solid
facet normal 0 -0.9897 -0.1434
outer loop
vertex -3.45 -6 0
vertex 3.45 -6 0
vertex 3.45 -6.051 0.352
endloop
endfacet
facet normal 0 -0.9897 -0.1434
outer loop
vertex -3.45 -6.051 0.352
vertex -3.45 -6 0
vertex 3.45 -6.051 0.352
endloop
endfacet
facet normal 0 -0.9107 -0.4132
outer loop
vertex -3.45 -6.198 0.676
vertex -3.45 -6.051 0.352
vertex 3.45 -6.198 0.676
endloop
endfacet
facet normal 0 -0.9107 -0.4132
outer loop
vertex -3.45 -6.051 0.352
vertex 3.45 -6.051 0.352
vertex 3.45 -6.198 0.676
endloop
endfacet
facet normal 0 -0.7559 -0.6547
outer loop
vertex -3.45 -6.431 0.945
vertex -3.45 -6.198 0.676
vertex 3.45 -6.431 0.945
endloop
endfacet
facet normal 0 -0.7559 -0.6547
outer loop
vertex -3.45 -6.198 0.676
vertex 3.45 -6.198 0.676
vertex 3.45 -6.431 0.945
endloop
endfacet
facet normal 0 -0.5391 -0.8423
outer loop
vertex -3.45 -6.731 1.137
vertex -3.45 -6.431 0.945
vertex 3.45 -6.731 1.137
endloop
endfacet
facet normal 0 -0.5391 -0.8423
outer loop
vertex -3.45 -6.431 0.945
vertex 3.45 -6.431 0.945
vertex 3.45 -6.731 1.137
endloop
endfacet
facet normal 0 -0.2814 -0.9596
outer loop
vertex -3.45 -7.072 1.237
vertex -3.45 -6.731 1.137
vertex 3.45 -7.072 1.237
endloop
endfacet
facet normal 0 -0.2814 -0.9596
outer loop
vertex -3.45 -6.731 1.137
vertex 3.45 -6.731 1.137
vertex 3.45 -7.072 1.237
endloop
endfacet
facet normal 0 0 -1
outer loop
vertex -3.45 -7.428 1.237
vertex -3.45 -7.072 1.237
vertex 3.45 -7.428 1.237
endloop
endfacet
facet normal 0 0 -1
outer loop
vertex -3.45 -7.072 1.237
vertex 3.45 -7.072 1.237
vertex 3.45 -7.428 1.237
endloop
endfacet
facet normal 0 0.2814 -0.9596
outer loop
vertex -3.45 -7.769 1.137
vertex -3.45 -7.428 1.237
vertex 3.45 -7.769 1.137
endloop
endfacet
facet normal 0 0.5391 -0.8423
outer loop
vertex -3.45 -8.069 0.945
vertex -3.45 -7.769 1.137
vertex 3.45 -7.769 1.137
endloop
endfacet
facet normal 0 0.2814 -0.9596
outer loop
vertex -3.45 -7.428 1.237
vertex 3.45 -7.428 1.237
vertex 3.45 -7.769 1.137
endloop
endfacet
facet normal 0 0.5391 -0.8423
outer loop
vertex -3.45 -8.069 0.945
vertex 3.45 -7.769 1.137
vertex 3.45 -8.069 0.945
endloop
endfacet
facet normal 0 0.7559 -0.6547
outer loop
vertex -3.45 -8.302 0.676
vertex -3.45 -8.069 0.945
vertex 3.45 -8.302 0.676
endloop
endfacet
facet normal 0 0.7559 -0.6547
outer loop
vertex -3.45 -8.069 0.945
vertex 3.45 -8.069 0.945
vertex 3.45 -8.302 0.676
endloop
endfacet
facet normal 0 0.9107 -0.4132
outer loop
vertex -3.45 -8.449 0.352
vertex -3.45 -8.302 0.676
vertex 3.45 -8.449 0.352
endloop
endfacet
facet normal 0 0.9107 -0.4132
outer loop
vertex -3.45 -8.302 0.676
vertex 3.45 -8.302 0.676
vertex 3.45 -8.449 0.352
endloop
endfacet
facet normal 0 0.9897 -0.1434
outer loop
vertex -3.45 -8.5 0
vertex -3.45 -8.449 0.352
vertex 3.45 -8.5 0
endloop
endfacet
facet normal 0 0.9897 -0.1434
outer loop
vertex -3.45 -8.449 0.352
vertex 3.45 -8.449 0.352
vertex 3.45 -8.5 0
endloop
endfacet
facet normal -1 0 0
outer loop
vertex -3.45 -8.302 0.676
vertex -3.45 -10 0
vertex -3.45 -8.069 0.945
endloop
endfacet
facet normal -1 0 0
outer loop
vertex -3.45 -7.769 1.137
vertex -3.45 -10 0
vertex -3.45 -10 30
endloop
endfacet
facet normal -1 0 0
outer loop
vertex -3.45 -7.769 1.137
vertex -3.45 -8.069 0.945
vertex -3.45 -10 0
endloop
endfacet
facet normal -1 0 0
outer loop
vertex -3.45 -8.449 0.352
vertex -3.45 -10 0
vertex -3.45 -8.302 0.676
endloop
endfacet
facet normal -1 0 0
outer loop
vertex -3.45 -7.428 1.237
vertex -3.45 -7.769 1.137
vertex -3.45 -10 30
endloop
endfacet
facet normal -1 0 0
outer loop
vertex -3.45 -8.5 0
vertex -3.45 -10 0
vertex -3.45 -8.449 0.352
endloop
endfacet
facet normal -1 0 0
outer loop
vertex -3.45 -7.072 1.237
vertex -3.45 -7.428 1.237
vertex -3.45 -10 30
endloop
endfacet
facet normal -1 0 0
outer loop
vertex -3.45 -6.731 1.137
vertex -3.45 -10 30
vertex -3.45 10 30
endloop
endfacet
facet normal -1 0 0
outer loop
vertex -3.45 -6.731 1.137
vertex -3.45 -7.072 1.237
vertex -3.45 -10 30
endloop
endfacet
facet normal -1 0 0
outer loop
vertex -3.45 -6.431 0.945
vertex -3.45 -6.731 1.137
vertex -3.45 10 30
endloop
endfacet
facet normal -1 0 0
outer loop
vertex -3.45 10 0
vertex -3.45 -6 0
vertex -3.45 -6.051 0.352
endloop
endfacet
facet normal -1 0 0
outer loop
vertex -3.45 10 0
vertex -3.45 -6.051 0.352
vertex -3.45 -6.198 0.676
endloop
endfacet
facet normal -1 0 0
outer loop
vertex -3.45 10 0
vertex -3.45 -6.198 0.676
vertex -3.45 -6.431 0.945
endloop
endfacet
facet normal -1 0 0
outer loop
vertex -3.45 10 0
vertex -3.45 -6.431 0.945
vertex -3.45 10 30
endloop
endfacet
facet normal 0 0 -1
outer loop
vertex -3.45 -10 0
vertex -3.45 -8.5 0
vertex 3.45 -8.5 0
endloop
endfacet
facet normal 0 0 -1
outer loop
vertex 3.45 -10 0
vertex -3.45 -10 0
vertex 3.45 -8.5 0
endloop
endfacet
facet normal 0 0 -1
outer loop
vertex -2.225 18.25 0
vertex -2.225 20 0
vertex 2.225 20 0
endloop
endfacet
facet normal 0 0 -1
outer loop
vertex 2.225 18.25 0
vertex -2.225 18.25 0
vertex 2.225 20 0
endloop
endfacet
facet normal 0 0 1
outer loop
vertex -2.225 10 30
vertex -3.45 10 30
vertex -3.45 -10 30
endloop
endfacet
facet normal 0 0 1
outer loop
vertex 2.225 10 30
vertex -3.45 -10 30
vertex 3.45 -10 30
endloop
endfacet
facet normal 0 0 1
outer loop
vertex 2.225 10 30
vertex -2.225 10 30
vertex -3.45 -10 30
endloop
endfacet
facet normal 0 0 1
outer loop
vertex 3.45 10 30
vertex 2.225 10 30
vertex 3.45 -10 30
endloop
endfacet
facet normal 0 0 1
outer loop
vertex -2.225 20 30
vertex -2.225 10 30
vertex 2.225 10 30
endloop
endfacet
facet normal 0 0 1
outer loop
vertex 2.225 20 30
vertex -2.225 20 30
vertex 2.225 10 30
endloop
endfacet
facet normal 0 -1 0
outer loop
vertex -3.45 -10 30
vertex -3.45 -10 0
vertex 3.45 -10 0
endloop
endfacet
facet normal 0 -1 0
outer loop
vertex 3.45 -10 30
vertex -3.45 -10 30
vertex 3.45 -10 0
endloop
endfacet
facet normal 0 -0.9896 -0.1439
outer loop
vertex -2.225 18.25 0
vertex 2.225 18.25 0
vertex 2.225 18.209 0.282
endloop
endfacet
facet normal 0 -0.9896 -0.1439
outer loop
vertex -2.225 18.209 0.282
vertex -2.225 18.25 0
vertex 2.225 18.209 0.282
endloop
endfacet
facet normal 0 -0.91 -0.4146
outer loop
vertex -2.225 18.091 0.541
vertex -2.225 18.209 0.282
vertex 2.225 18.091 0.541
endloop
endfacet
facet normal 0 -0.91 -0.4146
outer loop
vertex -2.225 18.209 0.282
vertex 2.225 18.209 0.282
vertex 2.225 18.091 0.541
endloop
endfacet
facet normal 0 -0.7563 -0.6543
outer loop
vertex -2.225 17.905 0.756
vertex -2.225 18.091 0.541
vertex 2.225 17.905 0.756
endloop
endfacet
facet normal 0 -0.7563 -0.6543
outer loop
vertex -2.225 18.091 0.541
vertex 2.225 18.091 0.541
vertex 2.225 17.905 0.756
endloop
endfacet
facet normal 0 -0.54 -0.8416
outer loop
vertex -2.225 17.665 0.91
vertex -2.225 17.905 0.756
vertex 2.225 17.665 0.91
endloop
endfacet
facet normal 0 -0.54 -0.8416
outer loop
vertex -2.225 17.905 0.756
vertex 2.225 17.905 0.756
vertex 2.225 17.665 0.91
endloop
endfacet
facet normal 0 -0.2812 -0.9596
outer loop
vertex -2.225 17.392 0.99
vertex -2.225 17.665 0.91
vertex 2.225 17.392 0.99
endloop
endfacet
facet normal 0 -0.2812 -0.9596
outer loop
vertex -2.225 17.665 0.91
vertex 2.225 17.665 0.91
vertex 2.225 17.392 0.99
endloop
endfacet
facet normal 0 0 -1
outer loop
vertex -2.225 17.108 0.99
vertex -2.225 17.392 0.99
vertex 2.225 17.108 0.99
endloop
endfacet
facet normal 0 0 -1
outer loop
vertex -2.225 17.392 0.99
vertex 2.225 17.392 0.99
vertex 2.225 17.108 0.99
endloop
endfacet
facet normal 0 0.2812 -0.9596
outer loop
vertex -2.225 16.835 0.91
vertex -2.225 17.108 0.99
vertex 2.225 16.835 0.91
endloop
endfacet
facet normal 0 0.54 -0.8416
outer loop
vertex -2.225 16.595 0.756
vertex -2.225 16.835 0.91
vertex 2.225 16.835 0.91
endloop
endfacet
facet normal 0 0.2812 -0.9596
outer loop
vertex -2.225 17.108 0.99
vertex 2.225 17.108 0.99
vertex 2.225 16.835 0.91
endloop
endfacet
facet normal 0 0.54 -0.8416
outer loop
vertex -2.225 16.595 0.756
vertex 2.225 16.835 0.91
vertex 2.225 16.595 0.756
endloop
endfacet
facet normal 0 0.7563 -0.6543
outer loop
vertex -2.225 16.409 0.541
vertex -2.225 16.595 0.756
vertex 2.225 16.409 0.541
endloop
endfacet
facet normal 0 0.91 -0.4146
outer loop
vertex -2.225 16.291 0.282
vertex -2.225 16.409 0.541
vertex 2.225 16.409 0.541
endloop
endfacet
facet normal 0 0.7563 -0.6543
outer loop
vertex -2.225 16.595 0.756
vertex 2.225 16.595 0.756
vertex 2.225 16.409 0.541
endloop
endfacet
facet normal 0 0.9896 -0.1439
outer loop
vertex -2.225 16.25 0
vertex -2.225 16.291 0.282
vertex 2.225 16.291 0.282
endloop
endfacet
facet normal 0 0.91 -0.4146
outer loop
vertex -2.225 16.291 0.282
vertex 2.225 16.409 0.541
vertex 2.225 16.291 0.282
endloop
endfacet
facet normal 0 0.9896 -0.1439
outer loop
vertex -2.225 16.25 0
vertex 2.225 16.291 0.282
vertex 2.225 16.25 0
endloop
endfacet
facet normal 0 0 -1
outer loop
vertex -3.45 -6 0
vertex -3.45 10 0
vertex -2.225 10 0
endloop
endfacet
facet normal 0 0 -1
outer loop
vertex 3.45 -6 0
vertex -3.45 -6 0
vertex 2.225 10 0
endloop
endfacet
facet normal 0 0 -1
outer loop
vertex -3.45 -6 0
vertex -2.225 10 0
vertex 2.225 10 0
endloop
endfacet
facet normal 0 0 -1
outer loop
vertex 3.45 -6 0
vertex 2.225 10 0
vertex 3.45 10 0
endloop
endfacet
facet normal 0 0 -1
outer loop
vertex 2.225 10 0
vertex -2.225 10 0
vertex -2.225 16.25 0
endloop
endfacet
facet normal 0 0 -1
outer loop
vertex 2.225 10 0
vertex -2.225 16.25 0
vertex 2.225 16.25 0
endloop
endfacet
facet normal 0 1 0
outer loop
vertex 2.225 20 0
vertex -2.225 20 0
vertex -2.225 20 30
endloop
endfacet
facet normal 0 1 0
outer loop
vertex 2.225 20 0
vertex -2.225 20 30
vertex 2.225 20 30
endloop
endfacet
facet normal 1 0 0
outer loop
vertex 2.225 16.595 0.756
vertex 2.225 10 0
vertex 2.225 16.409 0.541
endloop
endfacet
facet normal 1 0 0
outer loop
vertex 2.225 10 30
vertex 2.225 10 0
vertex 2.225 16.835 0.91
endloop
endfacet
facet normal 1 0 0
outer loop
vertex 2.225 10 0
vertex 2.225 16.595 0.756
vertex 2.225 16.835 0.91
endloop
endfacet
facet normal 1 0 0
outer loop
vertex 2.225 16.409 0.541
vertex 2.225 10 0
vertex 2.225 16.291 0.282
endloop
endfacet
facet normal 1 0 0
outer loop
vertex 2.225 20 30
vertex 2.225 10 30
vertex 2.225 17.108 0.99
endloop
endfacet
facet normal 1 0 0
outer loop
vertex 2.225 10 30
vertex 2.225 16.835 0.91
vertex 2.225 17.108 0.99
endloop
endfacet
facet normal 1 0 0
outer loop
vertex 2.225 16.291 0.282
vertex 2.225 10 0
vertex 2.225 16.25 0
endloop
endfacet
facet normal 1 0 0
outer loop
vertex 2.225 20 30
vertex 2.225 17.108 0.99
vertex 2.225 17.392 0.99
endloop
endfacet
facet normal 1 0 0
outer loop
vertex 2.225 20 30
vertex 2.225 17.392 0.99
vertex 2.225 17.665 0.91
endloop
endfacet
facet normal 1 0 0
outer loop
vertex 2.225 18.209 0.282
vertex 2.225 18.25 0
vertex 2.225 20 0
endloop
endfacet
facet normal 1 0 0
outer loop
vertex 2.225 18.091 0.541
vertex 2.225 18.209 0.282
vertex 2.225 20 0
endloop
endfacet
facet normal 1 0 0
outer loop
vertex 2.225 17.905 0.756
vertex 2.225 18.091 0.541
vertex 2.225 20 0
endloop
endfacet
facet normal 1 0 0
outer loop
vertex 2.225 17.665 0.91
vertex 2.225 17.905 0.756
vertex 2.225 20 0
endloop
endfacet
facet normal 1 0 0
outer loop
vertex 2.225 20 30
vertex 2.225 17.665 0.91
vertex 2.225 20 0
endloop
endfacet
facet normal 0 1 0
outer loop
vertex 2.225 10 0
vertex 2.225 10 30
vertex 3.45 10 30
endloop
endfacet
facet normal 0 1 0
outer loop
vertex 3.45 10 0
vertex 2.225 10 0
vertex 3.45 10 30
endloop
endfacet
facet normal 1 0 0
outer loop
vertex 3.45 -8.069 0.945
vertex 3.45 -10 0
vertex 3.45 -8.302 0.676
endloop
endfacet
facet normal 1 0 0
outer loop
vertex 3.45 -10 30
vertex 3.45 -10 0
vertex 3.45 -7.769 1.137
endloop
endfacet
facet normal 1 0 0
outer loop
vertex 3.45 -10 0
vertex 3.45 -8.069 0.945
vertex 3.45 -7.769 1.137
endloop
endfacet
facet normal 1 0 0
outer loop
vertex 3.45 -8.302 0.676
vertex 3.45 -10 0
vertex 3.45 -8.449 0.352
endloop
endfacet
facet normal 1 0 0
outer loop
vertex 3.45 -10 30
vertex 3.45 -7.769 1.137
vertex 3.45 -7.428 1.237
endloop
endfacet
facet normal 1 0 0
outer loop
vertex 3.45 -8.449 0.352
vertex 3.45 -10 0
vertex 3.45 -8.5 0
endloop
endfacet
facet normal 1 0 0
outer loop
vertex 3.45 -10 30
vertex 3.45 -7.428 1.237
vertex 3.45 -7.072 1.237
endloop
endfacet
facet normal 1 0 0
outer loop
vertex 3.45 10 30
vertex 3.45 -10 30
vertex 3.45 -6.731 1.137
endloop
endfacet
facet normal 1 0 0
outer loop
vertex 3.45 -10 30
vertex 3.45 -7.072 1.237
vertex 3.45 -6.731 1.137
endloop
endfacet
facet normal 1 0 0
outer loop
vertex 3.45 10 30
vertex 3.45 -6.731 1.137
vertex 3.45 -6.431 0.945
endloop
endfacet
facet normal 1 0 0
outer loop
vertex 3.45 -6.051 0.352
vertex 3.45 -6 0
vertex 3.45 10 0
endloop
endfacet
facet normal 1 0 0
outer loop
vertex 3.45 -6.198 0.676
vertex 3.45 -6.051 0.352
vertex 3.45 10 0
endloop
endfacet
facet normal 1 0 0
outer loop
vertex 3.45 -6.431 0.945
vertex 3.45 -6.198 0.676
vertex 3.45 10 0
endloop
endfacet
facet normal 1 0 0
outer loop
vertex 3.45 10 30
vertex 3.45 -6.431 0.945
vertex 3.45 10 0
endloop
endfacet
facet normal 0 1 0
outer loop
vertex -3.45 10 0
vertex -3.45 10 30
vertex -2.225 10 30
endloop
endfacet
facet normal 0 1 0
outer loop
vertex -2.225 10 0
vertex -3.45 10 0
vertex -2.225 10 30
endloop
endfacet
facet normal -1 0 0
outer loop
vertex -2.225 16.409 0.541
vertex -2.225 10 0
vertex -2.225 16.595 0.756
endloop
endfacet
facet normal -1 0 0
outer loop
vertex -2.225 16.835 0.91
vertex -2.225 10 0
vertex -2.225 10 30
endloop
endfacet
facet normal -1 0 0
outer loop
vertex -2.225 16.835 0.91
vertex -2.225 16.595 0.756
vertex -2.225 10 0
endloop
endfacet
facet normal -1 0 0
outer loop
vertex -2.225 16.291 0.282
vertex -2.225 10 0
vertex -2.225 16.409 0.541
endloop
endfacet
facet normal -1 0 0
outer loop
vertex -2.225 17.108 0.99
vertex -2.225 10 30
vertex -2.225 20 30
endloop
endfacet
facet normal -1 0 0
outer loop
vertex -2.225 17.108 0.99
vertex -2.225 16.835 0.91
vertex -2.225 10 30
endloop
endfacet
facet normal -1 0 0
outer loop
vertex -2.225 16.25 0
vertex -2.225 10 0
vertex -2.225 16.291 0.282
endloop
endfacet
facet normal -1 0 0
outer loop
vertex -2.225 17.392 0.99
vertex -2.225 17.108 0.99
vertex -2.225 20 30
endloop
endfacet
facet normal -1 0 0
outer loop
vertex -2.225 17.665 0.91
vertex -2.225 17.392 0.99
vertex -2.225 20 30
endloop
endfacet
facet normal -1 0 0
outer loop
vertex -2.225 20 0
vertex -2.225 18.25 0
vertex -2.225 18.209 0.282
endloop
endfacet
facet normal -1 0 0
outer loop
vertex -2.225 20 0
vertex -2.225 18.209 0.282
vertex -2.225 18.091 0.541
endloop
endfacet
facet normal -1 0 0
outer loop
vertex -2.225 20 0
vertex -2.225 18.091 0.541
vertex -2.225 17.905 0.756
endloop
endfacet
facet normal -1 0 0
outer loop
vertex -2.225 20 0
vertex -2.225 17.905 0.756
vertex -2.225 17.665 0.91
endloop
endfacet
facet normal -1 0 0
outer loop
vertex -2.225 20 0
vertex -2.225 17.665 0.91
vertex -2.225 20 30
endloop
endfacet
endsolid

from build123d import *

# Parameters (mm, degrees)
SKETCH_W      = 6.9
SKETCH_H      = 20
PAD_DEPTH     = 30
SKETCH001_W   = 4.45
SKETCH001_H   = 10
PAD001_DEPTH  = 30
SKETCH002_R   = 1
SKETCH002_R_2 = 1.25
POCKET_DEPTH  = 20


with BuildPart() as part:
    # Sketch → Pad (new body)
    with BuildSketch(Plane.XY):
        Rectangle(SKETCH_W, SKETCH_H)
    extrude(amount=PAD_DEPTH)

    # Sketch001 → Pad001 (join)
    with BuildSketch(Plane.XY):
        with Locations((0, 15)):
            Rectangle(SKETCH001_W, SKETCH001_H)
    extrude(amount=PAD001_DEPTH)

    # Sketch002 (on Face4 of Pad001) → Pocket (cut, symmetric)
    with BuildSketch(Plane.YZ.offset(2.225)):
        with Locations((17.25, 0)):
            Circle(SKETCH002_R)
        with Locations((-7.25, 0)):
            Circle(SKETCH002_R_2)
    extrude(amount=POCKET_DEPTH, both=True, mode=Mode.SUBTRACT)


solid = part.part
